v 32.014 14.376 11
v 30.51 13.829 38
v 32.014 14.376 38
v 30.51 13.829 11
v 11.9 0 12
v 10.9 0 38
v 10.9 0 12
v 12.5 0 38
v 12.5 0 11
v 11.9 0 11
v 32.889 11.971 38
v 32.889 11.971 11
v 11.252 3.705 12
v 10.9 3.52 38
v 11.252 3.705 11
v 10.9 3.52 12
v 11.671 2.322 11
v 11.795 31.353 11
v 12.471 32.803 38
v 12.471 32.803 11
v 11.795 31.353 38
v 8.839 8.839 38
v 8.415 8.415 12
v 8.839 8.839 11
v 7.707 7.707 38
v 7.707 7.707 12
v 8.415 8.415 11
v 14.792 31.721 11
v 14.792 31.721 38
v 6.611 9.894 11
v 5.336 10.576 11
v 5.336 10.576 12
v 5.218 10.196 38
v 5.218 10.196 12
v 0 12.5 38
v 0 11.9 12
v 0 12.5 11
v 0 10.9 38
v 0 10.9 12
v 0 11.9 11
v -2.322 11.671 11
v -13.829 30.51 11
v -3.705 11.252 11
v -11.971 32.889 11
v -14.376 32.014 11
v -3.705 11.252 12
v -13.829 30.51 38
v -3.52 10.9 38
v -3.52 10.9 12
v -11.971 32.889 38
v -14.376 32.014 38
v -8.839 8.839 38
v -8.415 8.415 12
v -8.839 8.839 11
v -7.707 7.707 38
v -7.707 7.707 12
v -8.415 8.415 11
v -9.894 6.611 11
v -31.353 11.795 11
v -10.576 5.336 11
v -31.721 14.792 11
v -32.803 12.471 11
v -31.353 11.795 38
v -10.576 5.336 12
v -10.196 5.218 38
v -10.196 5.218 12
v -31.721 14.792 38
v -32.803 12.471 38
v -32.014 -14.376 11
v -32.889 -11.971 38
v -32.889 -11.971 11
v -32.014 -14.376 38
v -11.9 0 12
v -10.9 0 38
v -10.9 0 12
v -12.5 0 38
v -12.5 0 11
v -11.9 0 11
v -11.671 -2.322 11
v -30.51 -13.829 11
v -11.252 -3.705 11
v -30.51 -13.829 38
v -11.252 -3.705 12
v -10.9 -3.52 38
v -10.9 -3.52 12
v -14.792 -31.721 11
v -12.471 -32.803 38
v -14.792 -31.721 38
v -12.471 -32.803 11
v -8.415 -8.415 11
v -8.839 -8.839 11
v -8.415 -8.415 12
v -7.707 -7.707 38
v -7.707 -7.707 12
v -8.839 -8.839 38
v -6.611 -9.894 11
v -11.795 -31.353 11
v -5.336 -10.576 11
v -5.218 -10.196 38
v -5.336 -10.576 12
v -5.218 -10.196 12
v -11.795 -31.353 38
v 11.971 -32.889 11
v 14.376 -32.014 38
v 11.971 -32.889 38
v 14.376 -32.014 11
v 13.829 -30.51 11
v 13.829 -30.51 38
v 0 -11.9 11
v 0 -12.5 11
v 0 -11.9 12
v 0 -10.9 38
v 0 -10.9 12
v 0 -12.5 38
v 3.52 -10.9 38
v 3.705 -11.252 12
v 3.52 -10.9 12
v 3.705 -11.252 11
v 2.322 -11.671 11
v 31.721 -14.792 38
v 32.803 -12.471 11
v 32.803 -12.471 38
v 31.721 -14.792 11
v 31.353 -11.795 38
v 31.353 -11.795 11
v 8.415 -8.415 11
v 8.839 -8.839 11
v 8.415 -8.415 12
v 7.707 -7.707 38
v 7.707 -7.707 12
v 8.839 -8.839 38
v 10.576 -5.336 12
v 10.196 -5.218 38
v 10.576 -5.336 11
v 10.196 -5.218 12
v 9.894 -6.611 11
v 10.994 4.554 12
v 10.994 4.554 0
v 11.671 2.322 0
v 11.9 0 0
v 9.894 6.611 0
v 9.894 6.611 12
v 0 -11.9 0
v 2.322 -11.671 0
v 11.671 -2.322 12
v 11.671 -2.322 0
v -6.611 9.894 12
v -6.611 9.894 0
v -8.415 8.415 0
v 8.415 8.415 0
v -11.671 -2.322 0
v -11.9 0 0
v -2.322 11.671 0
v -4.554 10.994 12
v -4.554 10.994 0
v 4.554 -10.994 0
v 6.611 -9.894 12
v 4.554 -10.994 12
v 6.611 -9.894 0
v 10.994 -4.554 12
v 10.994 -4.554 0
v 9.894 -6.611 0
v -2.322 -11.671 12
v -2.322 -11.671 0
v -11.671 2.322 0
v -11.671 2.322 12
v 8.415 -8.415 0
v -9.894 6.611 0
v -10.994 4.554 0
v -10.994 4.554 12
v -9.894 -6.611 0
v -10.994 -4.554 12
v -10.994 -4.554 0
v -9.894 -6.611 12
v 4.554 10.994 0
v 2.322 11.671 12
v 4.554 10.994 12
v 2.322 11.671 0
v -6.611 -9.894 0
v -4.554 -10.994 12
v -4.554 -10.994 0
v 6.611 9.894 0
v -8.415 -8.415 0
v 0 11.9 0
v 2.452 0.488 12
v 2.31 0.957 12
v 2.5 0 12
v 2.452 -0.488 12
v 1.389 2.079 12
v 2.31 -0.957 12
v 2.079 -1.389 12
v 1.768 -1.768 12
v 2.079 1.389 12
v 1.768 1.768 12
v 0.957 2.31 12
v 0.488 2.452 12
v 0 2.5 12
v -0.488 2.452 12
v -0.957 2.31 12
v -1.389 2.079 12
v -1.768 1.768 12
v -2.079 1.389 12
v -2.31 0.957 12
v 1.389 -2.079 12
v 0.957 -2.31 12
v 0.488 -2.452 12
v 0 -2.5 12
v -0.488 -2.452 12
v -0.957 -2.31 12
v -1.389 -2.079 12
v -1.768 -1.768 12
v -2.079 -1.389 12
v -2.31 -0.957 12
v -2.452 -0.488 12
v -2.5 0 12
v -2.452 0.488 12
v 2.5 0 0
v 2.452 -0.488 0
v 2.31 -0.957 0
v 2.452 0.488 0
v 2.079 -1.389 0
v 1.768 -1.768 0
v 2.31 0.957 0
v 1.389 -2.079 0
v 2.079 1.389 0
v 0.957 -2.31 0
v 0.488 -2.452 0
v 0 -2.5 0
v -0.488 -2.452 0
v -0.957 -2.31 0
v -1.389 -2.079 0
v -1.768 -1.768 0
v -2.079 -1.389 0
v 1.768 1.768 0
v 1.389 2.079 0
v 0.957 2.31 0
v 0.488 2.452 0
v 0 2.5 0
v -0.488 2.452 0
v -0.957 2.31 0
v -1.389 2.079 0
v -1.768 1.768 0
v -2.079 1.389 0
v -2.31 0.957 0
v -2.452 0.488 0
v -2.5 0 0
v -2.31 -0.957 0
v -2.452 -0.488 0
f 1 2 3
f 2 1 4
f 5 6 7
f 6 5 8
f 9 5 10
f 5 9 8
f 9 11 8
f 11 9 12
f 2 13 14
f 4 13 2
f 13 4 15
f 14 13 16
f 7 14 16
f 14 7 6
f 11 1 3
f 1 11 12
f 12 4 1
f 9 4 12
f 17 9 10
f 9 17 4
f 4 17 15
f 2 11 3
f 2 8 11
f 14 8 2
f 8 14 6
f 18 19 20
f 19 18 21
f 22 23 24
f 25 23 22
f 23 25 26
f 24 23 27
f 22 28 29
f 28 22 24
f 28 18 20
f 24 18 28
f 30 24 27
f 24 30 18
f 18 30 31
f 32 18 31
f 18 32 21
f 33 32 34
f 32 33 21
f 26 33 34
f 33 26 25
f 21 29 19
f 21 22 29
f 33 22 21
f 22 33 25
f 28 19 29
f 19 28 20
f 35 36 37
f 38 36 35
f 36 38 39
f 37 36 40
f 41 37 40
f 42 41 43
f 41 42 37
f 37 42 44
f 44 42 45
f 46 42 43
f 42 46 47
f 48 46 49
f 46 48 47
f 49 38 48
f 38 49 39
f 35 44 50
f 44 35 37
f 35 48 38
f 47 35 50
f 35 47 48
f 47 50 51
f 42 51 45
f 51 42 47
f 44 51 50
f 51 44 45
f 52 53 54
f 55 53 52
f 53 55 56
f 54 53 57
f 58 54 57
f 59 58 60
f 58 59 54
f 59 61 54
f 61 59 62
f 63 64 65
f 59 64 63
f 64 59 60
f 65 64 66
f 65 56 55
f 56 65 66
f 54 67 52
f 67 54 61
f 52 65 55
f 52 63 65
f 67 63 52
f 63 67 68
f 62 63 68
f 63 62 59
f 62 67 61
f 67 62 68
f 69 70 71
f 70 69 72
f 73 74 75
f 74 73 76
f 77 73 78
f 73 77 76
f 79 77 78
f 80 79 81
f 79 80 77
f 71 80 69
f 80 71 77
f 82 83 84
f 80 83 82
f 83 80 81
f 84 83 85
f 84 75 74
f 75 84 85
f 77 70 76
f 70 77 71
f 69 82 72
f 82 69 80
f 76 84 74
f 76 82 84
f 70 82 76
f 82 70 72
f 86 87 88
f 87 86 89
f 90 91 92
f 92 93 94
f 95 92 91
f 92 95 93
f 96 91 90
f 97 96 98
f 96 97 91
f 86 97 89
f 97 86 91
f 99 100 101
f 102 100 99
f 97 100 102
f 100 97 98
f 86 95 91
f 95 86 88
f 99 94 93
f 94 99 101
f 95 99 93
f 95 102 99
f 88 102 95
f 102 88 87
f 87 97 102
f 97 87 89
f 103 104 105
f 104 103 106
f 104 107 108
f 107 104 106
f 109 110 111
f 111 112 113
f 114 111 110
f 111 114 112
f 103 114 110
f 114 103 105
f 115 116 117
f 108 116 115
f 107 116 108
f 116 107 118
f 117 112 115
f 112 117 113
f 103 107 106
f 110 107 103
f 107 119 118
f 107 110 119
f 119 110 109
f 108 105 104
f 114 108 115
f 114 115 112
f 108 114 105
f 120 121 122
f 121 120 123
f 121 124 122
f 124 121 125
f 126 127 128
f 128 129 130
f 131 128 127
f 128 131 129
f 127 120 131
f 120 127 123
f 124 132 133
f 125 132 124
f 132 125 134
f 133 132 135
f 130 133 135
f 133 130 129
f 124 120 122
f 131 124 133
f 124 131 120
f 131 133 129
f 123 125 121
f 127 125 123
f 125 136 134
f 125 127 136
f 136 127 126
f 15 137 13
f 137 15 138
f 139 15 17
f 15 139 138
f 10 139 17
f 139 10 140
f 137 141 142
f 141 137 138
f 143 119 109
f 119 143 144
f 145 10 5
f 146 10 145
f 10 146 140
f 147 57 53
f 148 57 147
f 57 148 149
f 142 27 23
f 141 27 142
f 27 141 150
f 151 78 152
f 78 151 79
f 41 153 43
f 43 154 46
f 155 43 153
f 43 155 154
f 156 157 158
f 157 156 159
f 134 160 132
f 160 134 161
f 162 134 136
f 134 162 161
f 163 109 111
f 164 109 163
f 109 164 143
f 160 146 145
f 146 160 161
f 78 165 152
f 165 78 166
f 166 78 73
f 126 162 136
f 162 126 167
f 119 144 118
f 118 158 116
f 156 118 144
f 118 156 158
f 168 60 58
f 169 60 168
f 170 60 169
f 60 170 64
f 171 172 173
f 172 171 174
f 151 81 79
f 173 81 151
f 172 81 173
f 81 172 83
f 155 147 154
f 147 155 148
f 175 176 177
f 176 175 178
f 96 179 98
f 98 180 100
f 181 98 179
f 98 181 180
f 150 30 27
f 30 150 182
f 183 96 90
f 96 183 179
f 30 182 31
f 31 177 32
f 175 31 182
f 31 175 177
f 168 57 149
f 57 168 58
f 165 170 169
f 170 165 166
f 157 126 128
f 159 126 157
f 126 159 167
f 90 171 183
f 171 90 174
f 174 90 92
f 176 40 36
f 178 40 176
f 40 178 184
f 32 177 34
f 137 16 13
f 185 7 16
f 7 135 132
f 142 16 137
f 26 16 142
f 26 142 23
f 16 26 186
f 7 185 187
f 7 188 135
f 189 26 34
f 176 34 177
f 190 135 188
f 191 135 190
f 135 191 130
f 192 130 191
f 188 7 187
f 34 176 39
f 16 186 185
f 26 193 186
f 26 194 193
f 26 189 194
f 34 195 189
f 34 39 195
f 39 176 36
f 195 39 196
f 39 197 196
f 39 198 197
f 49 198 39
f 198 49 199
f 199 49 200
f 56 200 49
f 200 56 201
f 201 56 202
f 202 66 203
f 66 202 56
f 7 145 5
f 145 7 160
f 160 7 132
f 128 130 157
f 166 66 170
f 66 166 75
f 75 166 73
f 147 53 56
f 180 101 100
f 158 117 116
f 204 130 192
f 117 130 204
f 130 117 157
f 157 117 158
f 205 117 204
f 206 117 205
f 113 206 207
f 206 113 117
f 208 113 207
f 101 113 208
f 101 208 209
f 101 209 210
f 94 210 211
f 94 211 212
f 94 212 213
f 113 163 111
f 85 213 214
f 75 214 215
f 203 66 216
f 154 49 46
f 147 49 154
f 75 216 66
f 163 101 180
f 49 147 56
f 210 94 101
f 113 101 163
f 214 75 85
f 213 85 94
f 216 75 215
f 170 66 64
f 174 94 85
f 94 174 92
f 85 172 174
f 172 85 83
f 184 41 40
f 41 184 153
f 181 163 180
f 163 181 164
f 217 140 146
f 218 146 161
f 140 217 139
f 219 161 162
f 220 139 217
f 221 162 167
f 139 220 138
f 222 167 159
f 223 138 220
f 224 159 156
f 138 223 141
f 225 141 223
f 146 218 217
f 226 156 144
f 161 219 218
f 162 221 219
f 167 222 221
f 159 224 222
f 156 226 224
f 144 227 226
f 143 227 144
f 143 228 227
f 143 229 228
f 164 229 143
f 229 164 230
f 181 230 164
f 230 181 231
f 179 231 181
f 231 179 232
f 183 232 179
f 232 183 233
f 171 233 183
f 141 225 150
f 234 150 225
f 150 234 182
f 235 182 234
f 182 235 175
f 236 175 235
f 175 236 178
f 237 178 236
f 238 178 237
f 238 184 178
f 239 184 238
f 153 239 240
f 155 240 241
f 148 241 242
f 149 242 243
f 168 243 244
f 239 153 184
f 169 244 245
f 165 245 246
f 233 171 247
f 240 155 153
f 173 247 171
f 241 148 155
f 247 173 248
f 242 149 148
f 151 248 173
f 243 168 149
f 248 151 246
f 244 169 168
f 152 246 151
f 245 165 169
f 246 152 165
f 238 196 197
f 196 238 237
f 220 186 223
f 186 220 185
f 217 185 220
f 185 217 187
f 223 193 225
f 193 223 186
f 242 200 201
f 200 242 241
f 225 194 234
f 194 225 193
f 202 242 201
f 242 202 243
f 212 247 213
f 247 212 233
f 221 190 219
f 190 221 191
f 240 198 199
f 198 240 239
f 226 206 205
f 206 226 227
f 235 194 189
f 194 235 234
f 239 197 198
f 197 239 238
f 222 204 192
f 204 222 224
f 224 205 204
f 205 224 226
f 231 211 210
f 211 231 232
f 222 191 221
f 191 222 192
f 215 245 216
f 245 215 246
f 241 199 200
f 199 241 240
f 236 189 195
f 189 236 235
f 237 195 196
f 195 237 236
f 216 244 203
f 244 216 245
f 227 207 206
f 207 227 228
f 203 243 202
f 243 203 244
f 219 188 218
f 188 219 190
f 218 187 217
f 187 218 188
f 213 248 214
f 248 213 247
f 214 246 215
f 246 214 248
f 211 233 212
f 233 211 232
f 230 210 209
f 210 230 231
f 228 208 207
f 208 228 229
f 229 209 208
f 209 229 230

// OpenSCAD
$fn = 32;

// ----------------------------------------------------------------------
// Impeller: 70 mm, 8 blades, 38 mm tall
// ----------------------------------------------------------------------

// --- parameters (mm) ---
center_d = 23.8;          // hub diameter
center_h = 12;            // hub height
wheel_d = 70;             // outer diameter over the blades
blade_count = 8;          // number of blades
blade_t = 1.6;            // blade thickness
blade_h = 26;             // blade height
blade_in_r = 10.9;        // blade root radius
blade_out_r = 33.4;       // blade tip radius
sweep = 20;               // blade sweep, degrees
bore_d = 5;               // shaft bore

module hub() {
  cylinder(h = center_h, d = center_d);
}

module blade() {
  /* blade swept between two boxes: hull of the root and the tip section */
  hull() {
    translate([blade_in_r, 0, center_h - 1])
      cube([blade_t, blade_t * 2.2, blade_h + 1], center = false);
    rotate([0, 0, sweep])
      translate([blade_out_r, 0, center_h - 1])
        cube([blade_t, blade_t * 1.6, blade_h + 1], center = false);
  }
}

module blades() {
  for (i = [0 : blade_count - 1])
    rotate([0, 0, i * 360 / blade_count]) blade();
}

difference() {
  union() {
    hub();
    blades();
  }
  translate([0, 0, -1]) cylinder(h = center_h + blade_h + 0 + 3, d = bore_d);
}
